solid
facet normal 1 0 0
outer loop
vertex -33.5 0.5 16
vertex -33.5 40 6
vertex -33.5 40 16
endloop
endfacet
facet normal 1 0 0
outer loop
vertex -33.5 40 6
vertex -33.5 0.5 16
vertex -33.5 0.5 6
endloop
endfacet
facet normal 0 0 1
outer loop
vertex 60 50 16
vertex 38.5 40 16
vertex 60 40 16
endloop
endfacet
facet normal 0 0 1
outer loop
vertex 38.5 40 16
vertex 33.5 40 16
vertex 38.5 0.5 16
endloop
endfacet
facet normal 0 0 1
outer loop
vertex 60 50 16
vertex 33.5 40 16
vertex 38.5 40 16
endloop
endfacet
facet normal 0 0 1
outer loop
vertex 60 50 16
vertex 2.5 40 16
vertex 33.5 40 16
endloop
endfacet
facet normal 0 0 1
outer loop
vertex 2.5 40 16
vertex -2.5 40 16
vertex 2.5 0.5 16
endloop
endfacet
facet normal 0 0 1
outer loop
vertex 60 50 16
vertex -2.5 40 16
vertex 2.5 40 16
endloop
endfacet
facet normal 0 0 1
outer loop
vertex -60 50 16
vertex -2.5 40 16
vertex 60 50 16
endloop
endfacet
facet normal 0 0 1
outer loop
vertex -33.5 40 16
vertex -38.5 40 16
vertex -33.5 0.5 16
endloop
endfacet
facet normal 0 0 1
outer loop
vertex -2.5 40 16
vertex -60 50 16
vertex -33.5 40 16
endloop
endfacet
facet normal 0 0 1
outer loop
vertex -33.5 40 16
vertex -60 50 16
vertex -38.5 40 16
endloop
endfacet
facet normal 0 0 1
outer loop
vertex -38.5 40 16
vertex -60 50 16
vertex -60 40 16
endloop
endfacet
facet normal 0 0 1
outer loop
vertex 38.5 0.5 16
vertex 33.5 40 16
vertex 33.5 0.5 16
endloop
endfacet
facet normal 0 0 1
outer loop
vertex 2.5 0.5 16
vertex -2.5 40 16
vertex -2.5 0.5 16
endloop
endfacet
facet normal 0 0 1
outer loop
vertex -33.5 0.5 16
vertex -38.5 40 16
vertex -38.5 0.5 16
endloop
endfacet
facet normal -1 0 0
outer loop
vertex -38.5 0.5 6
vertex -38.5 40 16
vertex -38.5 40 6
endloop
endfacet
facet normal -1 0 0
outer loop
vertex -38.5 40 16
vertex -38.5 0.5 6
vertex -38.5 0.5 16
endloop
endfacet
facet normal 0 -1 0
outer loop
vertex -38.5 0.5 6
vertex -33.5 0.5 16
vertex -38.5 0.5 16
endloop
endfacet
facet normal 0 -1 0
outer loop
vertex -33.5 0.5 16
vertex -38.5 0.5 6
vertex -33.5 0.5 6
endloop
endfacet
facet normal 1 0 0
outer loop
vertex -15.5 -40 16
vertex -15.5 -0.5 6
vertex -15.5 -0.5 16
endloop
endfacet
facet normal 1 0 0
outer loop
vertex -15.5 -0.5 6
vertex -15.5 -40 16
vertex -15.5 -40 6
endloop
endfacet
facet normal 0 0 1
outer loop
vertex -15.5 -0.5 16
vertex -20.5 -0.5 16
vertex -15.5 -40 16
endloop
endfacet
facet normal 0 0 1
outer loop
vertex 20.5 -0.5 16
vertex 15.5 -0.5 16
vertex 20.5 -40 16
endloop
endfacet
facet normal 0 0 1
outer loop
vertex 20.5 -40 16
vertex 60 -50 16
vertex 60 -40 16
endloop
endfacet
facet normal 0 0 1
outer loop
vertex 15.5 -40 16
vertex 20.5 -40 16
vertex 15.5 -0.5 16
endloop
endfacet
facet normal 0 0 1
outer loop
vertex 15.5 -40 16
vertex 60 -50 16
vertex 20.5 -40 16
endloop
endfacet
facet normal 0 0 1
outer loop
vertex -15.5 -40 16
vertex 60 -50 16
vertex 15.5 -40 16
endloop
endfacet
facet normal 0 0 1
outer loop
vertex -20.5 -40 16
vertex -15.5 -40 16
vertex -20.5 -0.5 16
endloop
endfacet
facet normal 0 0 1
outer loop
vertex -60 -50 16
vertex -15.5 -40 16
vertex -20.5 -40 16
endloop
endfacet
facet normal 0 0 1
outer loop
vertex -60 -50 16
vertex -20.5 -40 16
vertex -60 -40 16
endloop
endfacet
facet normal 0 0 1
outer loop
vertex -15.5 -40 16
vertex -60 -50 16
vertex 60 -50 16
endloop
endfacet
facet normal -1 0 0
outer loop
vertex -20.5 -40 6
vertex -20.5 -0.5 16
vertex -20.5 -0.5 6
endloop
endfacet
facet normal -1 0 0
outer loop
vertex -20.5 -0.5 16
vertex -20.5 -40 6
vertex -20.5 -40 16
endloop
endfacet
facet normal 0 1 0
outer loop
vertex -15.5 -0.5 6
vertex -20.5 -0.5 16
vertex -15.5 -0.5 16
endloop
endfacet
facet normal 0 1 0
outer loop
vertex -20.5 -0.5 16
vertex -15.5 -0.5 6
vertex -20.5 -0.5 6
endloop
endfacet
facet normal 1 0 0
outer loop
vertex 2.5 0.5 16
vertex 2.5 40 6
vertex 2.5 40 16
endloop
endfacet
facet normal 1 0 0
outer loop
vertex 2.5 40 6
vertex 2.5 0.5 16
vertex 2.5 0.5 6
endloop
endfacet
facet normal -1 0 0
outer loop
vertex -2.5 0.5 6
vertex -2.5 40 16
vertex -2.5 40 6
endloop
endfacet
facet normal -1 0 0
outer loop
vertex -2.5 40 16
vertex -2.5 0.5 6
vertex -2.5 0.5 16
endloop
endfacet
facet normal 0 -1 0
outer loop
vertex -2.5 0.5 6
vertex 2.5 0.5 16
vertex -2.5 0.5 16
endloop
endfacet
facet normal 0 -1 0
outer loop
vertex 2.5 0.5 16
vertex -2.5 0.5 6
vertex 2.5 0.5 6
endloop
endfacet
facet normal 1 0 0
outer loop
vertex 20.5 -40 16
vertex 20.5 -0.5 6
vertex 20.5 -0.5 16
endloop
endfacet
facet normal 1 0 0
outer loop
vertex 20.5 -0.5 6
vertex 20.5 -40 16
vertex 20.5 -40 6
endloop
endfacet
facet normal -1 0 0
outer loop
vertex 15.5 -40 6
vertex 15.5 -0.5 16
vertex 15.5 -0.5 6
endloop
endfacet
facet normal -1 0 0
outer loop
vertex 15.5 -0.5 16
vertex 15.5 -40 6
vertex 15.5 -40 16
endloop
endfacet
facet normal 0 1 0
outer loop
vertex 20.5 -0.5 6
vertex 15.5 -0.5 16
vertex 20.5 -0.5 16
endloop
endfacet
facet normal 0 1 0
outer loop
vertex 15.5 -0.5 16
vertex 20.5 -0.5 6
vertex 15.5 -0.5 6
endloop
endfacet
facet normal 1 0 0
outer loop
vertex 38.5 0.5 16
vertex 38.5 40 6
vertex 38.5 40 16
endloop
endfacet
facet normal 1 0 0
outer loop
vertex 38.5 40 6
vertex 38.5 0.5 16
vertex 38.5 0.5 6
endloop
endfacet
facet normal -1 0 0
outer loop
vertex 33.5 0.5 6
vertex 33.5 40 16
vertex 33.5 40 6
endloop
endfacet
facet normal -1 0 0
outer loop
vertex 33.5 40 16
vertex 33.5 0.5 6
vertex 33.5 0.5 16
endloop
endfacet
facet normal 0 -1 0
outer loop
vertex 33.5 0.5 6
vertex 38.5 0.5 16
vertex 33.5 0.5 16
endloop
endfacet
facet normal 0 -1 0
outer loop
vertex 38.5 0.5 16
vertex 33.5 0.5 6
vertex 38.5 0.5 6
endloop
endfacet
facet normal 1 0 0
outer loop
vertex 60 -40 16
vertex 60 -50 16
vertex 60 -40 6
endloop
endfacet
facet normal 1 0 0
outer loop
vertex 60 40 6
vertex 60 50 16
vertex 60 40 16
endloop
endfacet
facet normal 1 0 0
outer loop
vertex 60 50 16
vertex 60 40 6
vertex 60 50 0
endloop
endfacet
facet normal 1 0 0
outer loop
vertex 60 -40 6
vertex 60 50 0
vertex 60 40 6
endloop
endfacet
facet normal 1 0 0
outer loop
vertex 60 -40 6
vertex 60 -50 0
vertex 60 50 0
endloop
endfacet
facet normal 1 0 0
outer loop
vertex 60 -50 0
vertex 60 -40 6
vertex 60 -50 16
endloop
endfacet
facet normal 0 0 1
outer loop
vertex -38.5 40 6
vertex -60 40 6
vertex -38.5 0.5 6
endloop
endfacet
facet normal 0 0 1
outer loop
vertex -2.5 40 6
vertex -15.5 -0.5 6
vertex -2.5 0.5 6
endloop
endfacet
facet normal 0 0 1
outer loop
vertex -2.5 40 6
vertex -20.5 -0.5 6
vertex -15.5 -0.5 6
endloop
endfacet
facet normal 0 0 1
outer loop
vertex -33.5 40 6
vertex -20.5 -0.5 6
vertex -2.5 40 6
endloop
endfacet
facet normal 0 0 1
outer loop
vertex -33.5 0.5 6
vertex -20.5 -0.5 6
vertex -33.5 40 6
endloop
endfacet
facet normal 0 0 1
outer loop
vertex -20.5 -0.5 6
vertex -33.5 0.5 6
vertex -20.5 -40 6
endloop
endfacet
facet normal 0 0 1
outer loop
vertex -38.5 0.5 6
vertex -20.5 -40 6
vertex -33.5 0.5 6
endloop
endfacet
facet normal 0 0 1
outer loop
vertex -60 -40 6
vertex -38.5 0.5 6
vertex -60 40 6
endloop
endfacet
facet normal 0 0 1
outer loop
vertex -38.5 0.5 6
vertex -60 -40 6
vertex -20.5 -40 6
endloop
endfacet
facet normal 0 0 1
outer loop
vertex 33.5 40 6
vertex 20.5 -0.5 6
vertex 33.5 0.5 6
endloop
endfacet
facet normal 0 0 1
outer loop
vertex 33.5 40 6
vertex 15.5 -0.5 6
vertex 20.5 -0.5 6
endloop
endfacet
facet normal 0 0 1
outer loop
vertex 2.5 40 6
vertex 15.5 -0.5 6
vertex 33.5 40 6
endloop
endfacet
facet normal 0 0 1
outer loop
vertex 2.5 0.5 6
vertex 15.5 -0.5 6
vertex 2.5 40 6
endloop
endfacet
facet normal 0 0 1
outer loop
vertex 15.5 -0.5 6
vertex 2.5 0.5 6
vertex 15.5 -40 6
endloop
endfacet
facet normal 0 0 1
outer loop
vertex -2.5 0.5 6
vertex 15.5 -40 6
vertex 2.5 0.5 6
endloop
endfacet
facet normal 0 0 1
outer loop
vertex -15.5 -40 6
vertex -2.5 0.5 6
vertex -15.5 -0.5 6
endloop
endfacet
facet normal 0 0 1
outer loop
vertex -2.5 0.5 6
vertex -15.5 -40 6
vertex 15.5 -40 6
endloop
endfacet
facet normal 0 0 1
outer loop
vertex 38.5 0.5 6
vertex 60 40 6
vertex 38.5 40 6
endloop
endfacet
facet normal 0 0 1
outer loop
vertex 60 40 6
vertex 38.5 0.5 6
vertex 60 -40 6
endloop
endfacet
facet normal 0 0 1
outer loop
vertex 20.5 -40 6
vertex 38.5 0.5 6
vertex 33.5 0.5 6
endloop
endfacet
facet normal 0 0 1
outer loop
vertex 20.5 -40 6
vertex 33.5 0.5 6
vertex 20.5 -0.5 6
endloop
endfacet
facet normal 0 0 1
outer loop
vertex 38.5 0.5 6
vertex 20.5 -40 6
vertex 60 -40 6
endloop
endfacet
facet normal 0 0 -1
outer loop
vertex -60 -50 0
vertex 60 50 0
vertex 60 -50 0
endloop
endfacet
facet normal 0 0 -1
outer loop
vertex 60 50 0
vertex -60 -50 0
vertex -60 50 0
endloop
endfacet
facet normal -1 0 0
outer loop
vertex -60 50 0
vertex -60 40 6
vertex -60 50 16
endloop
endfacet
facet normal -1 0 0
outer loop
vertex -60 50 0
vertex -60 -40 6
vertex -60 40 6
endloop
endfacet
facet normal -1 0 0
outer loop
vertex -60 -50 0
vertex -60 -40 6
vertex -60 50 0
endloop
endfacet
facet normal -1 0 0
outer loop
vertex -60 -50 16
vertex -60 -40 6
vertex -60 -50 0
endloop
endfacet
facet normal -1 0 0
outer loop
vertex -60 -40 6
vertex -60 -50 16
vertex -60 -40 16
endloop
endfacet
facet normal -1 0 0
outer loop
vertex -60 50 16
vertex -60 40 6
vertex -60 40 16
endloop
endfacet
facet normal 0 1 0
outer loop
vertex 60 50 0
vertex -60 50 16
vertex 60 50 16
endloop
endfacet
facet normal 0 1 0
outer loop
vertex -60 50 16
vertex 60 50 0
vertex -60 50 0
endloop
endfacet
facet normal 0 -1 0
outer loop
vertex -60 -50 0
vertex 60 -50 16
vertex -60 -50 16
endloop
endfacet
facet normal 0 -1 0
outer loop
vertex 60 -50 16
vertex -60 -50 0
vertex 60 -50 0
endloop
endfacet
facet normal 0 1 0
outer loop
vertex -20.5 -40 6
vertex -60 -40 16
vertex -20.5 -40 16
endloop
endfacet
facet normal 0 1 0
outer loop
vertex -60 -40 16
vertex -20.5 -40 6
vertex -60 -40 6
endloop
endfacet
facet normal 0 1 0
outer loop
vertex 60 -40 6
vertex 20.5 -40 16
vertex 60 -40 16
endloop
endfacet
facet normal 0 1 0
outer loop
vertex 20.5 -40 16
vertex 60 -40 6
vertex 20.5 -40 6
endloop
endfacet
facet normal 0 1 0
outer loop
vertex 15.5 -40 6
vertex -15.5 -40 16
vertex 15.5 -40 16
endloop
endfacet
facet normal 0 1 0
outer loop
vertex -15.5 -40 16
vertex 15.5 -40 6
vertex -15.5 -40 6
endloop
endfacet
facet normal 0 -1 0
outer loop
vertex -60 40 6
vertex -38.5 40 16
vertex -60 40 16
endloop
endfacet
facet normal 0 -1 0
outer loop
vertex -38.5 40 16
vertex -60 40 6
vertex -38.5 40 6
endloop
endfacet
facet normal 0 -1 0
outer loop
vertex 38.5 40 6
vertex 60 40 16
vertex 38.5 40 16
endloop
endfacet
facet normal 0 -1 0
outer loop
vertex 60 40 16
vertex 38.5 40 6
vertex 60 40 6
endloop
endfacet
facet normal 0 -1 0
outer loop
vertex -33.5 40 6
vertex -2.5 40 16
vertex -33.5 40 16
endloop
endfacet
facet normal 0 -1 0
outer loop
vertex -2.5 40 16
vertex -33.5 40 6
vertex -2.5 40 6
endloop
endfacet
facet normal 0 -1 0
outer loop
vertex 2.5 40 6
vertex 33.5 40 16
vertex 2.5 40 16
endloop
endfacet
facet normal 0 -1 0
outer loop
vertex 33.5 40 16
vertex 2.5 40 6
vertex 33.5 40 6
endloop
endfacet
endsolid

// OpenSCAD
$fn = 32;

// ----------------------------------------------------------------------
// Rib frame 120 x 100 x 16
// 5 ribs at 18 mm pitch, staggered
// ----------------------------------------------------------------------

// --- parameters (mm) ---
frame = [120, 100, 6];  // base plate size (x, y, z)
seat_tol = 0.1;         // tolerance at the seating features
free_tol = 0.5;         // general tolerance on the free sizes
rail_w = 10;            // side rail width
ribs = 5;               // number of ribs
rib_t = 5;              // rib thickness
rib_h = 10;             // rib height above the base plate
pitch = 18;             // pitch between rib centres

// --- derived feature positions (mm) ---
span = (ribs - 1) * pitch;          // = 72   distance between the outer ribs
origin_x = -span / 2;               // = -36   X of the first rib
rib_len = frame[1] / 2 - rail_w + 0.5;  // = 40.5   length of a staggered rib
rib_y = 0.5 + rib_len / 2;          // = 20.75   Y of a staggered rib centre
row_offset = 2 * rib_y;             // = 41.5   distance between the two rows
feature_centers = [
  [origin_x + 0 * pitch, rib_y],
  [origin_x + 1 * pitch, -rib_y],
  [origin_x + 2 * pitch, rib_y],
  [origin_x + 3 * pitch, -rib_y],
  [origin_x + 4 * pitch, rib_y]
];   // rib centre line, drives the rib loop

// base plate, two side rails, then the ribs read straight off feature_centers
union() {
  translate([-frame[0] / 2, -frame[1] / 2, 0]) cube(frame);
  translate([-frame[0] / 2, -frame[1] / 2, 0]) cube([frame[0], rail_w, frame[2] + rib_h]);
  translate([-frame[0] / 2, frame[1] / 2 - rail_w, 0]) cube([frame[0], rail_w, frame[2] + rib_h]);
  for (centre = feature_centers)
    translate([centre[0] - rib_t / 2, centre[1] - rib_len / 2, frame[2] - 1])
      cube([rib_t, rib_len, rib_h + 1]);
}
